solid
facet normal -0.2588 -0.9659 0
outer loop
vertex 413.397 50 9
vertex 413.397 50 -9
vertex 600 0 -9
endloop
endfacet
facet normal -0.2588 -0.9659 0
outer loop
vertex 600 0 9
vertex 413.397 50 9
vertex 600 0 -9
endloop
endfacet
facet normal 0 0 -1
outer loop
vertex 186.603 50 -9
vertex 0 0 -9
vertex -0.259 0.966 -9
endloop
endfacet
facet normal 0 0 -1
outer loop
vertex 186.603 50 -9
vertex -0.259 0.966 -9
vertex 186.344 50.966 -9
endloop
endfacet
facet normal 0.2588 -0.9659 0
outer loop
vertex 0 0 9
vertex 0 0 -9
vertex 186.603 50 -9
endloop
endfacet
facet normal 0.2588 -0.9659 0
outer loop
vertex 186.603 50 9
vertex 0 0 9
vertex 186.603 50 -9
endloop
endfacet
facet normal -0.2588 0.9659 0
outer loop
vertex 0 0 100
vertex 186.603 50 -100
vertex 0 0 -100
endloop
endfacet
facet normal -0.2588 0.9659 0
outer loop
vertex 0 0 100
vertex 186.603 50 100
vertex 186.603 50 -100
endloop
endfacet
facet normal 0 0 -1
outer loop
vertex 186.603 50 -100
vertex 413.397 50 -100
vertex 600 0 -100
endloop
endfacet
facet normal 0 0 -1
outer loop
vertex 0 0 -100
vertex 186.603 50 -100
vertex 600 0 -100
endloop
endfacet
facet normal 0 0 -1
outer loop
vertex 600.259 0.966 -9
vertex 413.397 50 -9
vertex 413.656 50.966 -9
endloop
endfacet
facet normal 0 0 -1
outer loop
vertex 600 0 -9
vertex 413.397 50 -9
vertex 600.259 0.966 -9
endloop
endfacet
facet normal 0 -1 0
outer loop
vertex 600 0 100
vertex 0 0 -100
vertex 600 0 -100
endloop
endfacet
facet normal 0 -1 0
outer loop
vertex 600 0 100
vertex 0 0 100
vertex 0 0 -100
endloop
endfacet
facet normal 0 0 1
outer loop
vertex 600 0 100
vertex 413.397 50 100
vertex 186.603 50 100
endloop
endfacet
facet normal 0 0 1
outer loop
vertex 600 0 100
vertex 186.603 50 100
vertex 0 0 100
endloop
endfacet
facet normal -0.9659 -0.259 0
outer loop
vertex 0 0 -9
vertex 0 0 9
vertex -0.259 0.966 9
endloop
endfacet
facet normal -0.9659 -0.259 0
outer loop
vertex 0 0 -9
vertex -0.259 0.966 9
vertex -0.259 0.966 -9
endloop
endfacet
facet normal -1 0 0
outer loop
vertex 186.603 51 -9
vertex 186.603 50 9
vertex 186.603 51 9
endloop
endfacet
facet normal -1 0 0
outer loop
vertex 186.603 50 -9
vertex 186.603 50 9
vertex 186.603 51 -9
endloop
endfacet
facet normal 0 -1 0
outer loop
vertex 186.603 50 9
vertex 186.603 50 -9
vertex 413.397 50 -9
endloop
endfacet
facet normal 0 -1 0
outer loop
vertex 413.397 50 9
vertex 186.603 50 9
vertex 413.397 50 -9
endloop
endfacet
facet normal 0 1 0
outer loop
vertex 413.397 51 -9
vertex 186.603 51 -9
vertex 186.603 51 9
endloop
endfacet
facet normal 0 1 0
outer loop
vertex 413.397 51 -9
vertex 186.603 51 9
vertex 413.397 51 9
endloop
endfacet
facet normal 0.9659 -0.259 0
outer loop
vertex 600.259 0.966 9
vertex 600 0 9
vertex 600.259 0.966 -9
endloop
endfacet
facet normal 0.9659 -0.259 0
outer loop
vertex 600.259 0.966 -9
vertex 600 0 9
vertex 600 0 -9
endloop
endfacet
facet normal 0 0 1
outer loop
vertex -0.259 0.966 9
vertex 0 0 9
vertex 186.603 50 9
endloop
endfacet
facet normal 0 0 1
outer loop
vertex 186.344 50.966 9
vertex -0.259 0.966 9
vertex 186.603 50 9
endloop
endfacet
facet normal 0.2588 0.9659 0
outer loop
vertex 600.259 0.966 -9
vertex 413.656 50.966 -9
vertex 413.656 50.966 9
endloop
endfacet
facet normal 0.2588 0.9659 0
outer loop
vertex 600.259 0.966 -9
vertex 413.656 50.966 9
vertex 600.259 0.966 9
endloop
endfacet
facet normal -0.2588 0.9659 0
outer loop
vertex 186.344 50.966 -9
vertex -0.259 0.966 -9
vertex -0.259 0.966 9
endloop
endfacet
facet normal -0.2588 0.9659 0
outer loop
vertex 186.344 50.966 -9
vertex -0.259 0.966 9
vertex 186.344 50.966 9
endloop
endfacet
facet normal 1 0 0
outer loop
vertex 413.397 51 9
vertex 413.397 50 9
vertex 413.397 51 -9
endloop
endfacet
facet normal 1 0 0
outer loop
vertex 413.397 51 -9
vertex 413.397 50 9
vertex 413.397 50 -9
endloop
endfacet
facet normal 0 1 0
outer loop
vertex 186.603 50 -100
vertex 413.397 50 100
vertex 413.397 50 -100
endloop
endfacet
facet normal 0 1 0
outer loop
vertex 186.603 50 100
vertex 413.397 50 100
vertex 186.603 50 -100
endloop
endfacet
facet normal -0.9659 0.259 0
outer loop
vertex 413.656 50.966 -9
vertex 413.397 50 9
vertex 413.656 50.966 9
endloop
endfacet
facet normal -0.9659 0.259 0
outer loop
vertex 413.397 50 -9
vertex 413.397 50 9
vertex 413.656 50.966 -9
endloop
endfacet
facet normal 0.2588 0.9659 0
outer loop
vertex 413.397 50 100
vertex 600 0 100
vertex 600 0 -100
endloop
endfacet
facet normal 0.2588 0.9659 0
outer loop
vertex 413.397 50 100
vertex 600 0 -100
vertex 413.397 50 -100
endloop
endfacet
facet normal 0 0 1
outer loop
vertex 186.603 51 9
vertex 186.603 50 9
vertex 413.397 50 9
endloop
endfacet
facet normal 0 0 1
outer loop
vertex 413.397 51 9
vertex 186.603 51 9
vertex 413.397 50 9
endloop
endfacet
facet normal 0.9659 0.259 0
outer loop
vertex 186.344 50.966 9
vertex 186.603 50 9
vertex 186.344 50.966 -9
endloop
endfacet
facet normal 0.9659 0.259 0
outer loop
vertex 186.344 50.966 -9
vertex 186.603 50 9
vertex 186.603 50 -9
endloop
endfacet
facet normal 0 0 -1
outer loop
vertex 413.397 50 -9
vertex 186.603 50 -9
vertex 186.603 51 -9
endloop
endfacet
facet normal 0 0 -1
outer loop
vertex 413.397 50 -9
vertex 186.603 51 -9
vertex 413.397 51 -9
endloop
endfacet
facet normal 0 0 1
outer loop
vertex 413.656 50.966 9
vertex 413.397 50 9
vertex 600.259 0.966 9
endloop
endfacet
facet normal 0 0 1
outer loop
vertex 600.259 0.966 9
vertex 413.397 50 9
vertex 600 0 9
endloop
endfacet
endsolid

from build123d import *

# Parameters (mm, degrees)
EXTRUDE_1_DEPTH = 100
SKETCH_3_W      = 193.185165257
SKETCH_3_H      = 18
EXTRUDE_2_DEPTH = 1
SKETCH_4_W      = 226.794919244
SKETCH_4_H      = 18
EXTRUDE_3_DEPTH = 1
SKETCH_5_W      = 193.185165258
SKETCH_5_H      = 18
EXTRUDE_4_DEPTH = 1


with BuildPart() as part:
    # 草圖1 → 填料-伸長1 (new body, symmetric)
    with BuildSketch(Plane.XY):
        Polygon((0, 0), (600, 0), (413.397459622, 50), (186.602540378, 50), align=None)
    extrude(amount=EXTRUDE_1_DEPTH, both=True)


with BuildPart() as body_2:
    # 草圖3 → 填料-伸長2 (new body)
    with BuildSketch(Plane(origin=(40.192378865, 150, 0), x_dir=(0.965925826, -0.258819045, 0), z_dir=(0.258819045, 0.965925826, 0))):
        with Locations((482.962913145, 0)):
            Rectangle(SKETCH_3_W, SKETCH_3_H)
    extrude(amount=EXTRUDE_2_DEPTH)


with BuildPart() as body_3:
    # 草圖4 → 填料-伸長3 (new body)
    with BuildSketch(Plane(origin=(0, 50, 0), x_dir=(1, 0, 0), z_dir=(0, 1, 0))):
        with Locations((300, 0)):
            Rectangle(SKETCH_4_W, SKETCH_4_H)
    extrude(amount=EXTRUDE_3_DEPTH)


with BuildPart() as body_4:
    # 草圖5 → 填料-伸長4 (new body)
    with BuildSketch(Plane(origin=(0, 0, 0), x_dir=(0.965925826, 0.258819045, 0), z_dir=(-0.258819045, 0.965925826, 0))):
        with Locations((96.592582629, 0)):
            Rectangle(SKETCH_5_W, SKETCH_5_H)
    extrude(amount=EXTRUDE_4_DEPTH)


solid = Compound([part.part, body_2.part, body_3.part, body_4.part])
